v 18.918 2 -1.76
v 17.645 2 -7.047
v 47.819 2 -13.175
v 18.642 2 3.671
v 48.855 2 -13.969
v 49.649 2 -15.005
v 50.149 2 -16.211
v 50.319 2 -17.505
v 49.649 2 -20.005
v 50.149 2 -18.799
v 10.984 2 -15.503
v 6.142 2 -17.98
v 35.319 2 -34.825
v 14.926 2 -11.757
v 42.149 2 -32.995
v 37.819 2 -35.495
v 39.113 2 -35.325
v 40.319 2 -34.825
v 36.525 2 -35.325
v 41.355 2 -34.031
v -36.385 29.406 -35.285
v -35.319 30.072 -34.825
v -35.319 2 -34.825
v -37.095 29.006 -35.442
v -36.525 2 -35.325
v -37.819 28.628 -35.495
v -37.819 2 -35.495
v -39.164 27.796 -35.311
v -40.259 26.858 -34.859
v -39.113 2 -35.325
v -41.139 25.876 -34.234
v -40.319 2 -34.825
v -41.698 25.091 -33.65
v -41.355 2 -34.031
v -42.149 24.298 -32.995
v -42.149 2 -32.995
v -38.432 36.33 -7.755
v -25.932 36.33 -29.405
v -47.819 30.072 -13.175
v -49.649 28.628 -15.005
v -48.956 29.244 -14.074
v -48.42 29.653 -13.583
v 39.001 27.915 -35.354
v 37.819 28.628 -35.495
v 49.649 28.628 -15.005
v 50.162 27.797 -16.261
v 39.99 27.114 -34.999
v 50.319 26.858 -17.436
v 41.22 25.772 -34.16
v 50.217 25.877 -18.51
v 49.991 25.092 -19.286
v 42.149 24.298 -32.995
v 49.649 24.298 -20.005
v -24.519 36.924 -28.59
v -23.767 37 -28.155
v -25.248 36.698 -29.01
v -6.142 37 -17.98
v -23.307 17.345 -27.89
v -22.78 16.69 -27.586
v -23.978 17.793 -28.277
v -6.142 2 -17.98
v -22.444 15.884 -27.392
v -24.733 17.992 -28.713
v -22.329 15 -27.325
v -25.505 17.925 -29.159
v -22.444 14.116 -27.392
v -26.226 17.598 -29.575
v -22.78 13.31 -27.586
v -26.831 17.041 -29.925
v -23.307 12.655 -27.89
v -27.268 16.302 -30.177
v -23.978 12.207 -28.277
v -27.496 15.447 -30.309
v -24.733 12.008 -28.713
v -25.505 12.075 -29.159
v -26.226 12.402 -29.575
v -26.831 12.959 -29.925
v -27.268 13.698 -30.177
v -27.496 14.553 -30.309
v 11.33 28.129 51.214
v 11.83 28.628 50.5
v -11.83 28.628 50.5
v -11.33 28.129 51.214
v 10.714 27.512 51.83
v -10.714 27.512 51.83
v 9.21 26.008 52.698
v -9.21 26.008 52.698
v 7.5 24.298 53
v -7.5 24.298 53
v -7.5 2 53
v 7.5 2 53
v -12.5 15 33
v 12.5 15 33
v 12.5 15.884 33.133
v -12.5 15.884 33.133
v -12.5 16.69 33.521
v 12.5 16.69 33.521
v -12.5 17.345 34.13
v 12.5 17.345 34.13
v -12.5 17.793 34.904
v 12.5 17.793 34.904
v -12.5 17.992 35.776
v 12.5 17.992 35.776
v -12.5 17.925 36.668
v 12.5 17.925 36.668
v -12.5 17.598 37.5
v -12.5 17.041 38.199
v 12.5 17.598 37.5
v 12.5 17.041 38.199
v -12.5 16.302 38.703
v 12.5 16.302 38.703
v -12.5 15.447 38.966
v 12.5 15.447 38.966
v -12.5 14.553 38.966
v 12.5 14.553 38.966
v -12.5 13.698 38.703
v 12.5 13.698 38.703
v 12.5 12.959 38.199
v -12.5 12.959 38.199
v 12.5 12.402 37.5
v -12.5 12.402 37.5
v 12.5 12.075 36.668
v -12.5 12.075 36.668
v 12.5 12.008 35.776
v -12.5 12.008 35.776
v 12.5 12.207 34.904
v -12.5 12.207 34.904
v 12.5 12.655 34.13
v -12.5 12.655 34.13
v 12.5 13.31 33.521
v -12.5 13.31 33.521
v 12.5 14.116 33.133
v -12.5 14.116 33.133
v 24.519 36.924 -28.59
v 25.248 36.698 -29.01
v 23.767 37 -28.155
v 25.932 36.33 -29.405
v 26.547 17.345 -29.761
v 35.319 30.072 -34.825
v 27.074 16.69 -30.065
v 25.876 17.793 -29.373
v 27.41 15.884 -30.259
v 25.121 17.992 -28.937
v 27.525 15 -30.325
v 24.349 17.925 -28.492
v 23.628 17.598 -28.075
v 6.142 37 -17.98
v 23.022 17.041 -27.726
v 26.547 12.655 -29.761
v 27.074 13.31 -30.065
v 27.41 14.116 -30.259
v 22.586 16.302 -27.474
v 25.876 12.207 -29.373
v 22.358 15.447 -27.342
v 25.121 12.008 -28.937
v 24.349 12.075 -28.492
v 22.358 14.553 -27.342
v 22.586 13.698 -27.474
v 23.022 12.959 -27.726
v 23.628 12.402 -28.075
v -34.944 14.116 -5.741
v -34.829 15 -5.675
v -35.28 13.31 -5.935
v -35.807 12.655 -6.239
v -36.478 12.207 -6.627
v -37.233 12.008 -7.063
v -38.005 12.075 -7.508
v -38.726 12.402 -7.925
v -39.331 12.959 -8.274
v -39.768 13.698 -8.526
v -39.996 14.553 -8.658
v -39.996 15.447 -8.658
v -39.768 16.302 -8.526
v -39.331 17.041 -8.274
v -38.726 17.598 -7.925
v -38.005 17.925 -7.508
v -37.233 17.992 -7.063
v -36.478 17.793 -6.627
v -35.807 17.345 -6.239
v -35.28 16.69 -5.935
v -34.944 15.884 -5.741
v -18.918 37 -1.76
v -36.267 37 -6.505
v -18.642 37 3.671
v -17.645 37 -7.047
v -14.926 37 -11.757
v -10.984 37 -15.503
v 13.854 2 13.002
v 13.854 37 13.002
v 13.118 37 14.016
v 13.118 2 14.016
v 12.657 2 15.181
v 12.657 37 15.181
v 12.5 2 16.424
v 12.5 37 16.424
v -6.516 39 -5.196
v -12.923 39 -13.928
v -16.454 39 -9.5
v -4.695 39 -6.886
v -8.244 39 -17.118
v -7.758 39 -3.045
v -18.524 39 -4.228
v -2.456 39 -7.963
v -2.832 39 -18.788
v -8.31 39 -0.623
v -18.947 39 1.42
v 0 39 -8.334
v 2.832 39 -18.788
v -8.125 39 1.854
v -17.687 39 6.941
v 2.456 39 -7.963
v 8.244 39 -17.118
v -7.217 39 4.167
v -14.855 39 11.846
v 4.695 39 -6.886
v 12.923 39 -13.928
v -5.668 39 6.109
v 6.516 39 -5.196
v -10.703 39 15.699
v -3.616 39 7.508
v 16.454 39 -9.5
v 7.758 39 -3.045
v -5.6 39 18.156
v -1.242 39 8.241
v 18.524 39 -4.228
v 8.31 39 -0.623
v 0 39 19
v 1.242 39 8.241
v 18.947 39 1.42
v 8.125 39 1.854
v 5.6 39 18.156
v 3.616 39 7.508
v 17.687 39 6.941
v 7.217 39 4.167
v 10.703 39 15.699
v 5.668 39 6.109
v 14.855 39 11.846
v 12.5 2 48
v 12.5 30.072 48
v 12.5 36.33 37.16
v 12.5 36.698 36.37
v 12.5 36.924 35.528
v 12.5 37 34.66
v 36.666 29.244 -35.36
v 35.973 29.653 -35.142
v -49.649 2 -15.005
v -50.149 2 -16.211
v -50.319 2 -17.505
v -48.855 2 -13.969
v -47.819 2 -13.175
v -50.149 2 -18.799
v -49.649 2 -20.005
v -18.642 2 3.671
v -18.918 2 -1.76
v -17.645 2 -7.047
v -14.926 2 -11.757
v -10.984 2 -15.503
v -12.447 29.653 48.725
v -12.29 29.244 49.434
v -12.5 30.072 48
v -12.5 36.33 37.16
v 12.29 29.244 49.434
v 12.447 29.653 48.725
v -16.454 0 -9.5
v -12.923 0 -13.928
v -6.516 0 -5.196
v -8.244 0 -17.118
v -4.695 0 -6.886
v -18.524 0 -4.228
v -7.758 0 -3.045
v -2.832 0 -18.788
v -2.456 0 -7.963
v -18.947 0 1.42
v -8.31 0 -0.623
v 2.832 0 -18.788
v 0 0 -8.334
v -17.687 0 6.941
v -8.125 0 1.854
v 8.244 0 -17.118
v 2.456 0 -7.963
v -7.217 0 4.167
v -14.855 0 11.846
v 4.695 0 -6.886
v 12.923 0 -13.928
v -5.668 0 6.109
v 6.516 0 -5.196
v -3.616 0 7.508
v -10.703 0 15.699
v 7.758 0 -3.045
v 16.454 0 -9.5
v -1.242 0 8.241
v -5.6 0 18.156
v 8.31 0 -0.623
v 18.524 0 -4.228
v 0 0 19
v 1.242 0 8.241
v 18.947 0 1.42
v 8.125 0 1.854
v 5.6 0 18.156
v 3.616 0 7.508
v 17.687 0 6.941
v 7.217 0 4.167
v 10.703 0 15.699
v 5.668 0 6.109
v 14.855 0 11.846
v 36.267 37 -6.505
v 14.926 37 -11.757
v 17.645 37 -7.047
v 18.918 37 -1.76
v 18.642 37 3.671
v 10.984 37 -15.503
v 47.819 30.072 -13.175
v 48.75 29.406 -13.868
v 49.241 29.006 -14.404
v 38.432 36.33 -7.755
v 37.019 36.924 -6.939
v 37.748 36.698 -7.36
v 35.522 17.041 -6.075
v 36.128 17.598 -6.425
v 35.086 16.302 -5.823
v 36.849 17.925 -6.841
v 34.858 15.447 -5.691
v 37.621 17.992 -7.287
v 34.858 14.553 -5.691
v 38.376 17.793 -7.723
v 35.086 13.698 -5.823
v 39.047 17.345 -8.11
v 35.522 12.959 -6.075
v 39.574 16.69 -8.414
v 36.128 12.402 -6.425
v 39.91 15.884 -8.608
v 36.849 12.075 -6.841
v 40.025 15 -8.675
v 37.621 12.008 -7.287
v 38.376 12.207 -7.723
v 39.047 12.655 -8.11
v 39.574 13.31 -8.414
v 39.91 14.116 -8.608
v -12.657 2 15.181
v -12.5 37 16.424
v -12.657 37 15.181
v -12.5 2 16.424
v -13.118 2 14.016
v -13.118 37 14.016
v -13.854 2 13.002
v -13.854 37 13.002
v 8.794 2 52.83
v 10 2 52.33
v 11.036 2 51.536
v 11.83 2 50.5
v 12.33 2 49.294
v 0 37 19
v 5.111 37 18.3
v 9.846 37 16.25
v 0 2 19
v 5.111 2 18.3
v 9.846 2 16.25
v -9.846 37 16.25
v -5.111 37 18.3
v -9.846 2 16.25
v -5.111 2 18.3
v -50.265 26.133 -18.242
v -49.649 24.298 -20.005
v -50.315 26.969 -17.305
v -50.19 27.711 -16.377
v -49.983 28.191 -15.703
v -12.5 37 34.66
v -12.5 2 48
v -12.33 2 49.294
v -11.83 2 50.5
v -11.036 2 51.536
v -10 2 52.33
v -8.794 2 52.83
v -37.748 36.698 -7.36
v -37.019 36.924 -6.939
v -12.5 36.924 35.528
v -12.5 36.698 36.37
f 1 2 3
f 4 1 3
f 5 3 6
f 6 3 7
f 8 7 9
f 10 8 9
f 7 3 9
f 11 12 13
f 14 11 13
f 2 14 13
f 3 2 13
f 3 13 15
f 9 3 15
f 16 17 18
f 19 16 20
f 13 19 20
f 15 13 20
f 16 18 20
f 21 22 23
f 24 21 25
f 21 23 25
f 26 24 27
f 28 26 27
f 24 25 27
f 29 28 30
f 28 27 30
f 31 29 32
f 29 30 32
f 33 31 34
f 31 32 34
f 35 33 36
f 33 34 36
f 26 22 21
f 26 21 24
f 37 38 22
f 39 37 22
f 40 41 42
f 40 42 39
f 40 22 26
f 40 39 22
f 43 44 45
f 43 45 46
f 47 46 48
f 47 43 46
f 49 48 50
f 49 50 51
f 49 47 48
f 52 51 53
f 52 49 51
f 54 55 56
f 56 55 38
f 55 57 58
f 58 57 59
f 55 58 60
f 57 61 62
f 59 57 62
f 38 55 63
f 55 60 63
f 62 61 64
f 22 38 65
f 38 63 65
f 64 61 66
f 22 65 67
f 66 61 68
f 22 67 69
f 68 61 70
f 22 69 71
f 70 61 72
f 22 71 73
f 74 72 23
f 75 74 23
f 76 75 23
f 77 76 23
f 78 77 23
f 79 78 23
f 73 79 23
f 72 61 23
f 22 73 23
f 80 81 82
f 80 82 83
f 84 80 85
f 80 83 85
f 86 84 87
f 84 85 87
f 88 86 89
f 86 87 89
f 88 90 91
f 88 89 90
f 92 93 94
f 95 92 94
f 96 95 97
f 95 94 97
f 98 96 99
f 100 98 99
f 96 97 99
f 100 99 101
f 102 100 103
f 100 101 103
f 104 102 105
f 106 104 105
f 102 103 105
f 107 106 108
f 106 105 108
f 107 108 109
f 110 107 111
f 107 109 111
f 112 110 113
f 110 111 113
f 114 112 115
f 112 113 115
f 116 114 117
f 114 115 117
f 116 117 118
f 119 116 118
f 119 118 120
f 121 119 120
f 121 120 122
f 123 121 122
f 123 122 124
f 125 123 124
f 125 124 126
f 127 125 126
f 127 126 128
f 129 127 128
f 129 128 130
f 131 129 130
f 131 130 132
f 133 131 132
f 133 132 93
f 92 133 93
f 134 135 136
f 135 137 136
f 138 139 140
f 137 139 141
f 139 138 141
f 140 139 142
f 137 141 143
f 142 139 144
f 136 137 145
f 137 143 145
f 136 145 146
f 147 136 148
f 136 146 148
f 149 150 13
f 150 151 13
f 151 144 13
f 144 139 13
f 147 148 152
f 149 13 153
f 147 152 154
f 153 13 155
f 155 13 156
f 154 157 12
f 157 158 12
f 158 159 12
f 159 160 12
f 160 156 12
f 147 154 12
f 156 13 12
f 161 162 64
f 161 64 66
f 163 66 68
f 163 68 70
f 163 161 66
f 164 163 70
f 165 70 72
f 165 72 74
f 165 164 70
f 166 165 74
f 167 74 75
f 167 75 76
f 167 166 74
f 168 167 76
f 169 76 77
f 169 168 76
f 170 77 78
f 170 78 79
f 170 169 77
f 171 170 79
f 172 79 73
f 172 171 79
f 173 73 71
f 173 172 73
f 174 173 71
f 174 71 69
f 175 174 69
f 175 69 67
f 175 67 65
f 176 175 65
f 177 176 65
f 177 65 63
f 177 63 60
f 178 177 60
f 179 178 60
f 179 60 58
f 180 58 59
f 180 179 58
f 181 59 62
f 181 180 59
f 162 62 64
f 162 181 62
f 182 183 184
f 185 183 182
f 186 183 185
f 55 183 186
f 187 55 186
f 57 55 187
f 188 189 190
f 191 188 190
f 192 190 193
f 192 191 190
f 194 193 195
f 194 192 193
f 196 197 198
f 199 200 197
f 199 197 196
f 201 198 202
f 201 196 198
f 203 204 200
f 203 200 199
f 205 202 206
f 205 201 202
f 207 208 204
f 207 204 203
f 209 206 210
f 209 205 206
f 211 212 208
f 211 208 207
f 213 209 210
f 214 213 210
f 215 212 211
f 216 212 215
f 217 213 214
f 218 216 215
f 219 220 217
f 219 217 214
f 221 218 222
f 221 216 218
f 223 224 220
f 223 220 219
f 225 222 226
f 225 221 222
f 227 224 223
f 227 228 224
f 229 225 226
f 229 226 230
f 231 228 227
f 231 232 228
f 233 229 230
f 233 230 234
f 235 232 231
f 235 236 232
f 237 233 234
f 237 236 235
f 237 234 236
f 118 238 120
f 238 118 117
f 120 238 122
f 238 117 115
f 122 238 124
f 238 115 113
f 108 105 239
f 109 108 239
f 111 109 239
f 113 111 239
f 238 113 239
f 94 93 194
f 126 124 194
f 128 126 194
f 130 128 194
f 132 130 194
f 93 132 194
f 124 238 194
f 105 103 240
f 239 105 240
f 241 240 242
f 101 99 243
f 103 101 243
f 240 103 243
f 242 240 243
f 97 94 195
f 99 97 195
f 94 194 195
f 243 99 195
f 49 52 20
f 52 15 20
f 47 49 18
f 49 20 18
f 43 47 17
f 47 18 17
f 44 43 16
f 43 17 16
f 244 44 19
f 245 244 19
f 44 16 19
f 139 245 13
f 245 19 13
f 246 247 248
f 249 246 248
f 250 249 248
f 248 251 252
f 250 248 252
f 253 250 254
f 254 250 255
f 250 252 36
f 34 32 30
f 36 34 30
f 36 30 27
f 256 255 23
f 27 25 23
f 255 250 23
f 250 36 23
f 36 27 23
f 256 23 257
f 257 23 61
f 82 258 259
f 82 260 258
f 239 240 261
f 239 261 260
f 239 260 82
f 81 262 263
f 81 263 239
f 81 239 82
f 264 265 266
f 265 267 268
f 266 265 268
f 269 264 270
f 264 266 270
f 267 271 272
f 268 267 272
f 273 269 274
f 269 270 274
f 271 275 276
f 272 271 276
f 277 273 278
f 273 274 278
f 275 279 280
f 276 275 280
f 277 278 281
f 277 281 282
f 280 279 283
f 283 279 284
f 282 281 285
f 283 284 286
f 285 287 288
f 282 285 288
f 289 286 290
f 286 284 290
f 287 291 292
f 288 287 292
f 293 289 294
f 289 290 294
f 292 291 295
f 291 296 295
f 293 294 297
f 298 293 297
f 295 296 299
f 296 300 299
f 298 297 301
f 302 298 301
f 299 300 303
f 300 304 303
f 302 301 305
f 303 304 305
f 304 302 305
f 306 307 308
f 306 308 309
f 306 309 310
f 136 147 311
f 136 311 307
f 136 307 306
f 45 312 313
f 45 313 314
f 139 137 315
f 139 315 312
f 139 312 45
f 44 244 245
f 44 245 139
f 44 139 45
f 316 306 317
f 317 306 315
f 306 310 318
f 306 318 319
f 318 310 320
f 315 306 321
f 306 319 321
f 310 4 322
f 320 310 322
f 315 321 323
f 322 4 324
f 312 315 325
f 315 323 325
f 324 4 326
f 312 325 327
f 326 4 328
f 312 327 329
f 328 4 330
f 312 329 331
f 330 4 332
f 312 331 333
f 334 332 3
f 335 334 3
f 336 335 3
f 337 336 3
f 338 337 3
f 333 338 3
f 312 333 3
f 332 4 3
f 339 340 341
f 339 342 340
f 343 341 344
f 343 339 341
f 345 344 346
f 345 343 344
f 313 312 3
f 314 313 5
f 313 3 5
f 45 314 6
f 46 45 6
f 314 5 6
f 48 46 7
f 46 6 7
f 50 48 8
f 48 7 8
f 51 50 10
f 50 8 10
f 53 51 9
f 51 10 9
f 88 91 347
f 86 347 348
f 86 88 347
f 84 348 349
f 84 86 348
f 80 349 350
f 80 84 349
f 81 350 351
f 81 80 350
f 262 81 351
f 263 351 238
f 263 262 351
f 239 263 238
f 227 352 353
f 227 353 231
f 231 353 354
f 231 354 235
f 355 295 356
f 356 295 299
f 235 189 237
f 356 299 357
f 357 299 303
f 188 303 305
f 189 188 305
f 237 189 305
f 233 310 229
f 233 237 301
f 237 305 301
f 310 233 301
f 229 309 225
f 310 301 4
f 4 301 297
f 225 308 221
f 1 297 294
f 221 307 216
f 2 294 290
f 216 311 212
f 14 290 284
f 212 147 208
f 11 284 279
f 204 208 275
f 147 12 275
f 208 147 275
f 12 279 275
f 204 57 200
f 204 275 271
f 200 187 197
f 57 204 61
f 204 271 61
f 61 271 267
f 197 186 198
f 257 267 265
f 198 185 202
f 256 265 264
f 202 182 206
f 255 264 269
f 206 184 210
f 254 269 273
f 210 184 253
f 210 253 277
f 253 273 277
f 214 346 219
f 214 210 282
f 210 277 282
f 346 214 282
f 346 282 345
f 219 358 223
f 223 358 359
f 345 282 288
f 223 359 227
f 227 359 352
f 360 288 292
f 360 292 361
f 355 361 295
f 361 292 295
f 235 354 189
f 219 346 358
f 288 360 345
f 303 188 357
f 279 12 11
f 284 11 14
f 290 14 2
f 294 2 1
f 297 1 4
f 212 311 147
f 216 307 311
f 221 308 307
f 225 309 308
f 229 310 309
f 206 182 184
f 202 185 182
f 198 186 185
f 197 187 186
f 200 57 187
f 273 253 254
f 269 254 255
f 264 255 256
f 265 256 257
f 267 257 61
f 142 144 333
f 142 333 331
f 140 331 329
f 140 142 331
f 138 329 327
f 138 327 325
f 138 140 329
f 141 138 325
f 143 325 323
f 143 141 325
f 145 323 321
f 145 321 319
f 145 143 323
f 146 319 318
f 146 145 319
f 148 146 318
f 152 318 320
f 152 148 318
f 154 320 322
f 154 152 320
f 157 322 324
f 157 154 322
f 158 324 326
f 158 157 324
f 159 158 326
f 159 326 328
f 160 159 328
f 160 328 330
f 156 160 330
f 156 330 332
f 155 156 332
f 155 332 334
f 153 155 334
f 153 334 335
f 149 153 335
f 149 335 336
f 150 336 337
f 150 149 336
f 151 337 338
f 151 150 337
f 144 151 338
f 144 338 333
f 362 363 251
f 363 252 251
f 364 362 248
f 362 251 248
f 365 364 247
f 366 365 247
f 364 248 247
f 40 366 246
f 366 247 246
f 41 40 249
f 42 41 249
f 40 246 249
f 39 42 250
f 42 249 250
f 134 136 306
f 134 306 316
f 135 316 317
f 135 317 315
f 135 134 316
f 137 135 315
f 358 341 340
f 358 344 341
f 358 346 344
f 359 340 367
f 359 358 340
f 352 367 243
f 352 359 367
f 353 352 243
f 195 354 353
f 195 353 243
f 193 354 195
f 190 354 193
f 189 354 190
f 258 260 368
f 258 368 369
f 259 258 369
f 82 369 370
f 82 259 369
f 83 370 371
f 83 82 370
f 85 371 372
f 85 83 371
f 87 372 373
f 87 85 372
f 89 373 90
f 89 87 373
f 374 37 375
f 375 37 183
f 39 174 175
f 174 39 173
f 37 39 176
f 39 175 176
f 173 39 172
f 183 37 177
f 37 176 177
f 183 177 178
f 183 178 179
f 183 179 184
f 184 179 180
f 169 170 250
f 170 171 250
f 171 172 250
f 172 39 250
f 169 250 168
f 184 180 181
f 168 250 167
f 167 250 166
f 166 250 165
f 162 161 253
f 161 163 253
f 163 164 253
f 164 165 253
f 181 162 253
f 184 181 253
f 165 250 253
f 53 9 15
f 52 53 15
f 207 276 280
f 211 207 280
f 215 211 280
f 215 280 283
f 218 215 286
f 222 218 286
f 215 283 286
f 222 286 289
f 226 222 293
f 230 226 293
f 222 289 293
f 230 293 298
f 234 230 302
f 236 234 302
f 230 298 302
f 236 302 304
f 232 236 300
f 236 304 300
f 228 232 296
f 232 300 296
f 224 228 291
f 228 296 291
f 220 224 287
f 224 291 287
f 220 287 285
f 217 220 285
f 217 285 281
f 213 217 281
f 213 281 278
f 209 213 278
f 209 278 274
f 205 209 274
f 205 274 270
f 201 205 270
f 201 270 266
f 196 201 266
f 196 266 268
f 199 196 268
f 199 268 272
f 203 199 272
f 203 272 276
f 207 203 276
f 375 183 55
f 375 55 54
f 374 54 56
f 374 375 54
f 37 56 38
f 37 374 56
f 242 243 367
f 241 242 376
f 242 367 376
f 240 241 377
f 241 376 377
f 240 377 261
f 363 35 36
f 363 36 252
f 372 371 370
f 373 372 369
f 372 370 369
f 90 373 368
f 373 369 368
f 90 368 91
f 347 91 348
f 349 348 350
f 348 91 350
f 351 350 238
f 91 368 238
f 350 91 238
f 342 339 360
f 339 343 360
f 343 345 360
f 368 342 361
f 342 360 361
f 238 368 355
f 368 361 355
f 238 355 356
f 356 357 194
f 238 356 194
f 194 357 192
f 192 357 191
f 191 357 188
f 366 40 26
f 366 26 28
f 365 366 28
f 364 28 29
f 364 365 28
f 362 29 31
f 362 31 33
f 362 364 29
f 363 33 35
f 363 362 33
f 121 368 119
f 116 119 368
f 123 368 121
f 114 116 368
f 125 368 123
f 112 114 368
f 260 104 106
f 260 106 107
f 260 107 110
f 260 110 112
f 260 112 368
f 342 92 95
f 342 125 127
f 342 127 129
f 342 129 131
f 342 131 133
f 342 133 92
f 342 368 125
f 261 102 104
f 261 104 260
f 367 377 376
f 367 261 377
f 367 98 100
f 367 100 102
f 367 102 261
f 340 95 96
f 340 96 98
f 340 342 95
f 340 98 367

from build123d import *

# Parameters (mm, degrees)
CROQUIS2_R                = 19
SALIENTE_EXTRUIR1_DEPTH   = 39
CROQUIS3_W                = 25
CROQUIS3_H                = 35
SALIENTE_EXTRUIR2_DEPTH   = 53
CROQUIS4_R                = 3
CORTAR_EXTRUIR1_DEPTH     = 73.953752474
REDONDEO1_R               = 5
MATRIZC2_START            = 2
MATRIZC2_DEPTH            = 9.9999999
MATRIZC2_START_2          = 18.0000001
MATRIZC2_2_DEPTH          = 6.298293978
MATRIZC2_START_3          = 11.9999999
MATRIZC2_3_DEPTH          = 25.0000001
MATRIZC2_START_4          = -12.5
MATRIZC2_4_OUTLINE_R      = 3
MATRIZC2_4_DEPTH          = 25
MATRIZC2_5_OUTLINE_R      = 3
MATRIZC2_5_DEPTH          = 25
TALADRO_ROSCADO_3_4_102_D = 16.66748


with BuildPart() as part:
    # Croquis2 → Saliente-Extruir1 (new body)
    with BuildSketch(Plane(origin=(0, 0, 0), x_dir=(1, 0, 0), z_dir=(0, 1, 0))):
        with Locations(Location((0, 0, 0), (0, 0, 270))):
            Circle(CROQUIS2_R)
    extrude(amount=SALIENTE_EXTRUIR1_DEPTH)

    # Croquis3 → Saliente-Extruir2 (add)
    with BuildSketch(Plane.XY):
        with Locations((0, 19.5)):
            Rectangle(CROQUIS3_W, CROQUIS3_H)
    extrude(amount=SALIENTE_EXTRUIR2_DEPTH)

    # Croquis4 → Cortar-Extruir1 (cut, through all)
    with BuildSketch(Plane(origin=(12.5, 0, 0), x_dir=(0, 0, -1), z_dir=(1, 0, 0))):
        with Locations((-36, 15)):
            Circle(CROQUIS4_R)
        Polygon((-53, 27.185045424), (-53, 37), (-36, 37), align=None)
    extrude(amount=-CORTAR_EXTRUIR1_DEPTH, mode=Mode.SUBTRACT)

    # Redondeo1
    redondeo1_edges = [part.edges().sort_by_distance(p)[0] for p in [
        (12.5, 14.592522712, 53),
        (-12.5, 14.592522712, 53),
        (0, 27.185045424, 53),
        (0, 37, 36),
        (12.5, 19.5, 14.309088021),
        (-12.5, 19.5, 14.309088021),
    ]]
    fillet(redondeo1_edges, radius=REDONDEO1_R)

    # MatrizC2: read off the stored shape, not the designer's step
    # MatrizC2 outline → MatrizC2 (add)
    with BuildSketch(Plane(origin=(0, 0, 0), x_dir=(1, 0, 0), z_dir=(0, 1, 0)).offset(MATRIZC2_START)):
        with BuildLine():
            Line((-42.149346401, 32.995190528), (-49.649346401, 20.004809472))
            ThreePointArc((-49.649346401, 20.004809472), (-50.148848513, 16.210714247), (-47.819219382, 13.174682453))
            Line((-47.819219382, 13.174682453), (-18.642033731, -3.670773537))
            ThreePointArc((-18.642033731, -3.670773537), (-16.454482672, 9.5), (-6.142033731, 17.979861558))
            Line((-6.142033731, 17.979861558), (-35.319219382, 34.825317547))
            ThreePointArc((-35.319219382, 34.825317547), (-39.113314608, 35.32481966), (-42.149346401, 32.995190528))
        make_face()
        with BuildLine():
            ThreePointArc((6.142033731, 17.979861558), (16.454482672, 9.5), (18.642033731, -3.670773537))
            Line((18.642033731, -3.670773537), (47.819219382, 13.174682453))
            ThreePointArc((47.819219382, 13.174682453), (50.148848513, 16.210714247), (49.649346401, 20.004809472))
            Line((49.649346401, 20.004809472), (42.149346401, 32.995190528))
            ThreePointArc((42.149346401, 32.995190528), (39.113314608, 35.32481966), (35.319219382, 34.825317547))
            Line((35.319219382, 34.825317547), (6.142033731, 17.979861558))
        make_face()
    extrude(amount=MATRIZC2_DEPTH)

    # MatrizC2 2 outline → MatrizC2 2 (add)
    with BuildSketch(Plane(origin=(0, 0, 0), x_dir=(1, 0, 0), z_dir=(0, 1, 0)).offset(MATRIZC2_START_2)):
        with BuildLine():
            Line((-42.149346401, 32.995190528), (-49.649346401, 20.004809472))
            ThreePointArc((-49.649346401, 20.004809472), (-50.148848513, 16.210714247), (-47.819219382, 13.174682453))
            Line((-47.819219382, 13.174682453), (-18.642033731, -3.670773537))
            ThreePointArc((-18.642033731, -3.670773537), (-16.454482672, 9.5), (-6.142033731, 17.979861558))
            Line((-6.142033731, 17.979861558), (-35.319219382, 34.825317547))
            ThreePointArc((-35.319219382, 34.825317547), (-39.113314608, 35.32481966), (-42.149346401, 32.995190528))
        make_face()
        with BuildLine():
            ThreePointArc((6.142033731, 17.979861558), (16.454482672, 9.5), (18.642033731, -3.670773537))
            Line((18.642033731, -3.670773537), (47.819219382, 13.174682453))
            ThreePointArc((47.819219382, 13.174682453), (50.148848513, 16.210714247), (49.649346401, 20.004809472))
            Line((49.649346401, 20.004809472), (42.149346401, 32.995190528))
            ThreePointArc((42.149346401, 32.995190528), (39.113314608, 35.32481966), (35.319219382, 34.825317547))
            Line((35.319219382, 34.825317547), (6.142033731, 17.979861558))
        make_face()
    extrude(amount=MATRIZC2_2_DEPTH)

    # MatrizC2 3 outline → MatrizC2 3 (add)
    with BuildSketch(Plane(origin=(0, 0, 0), x_dir=(1, 0, 0), z_dir=(0, 1, 0)).offset(MATRIZC2_START_3)):
        with BuildLine():
            Line((-42.149346401, 32.995190528), (-49.649346401, 20.004809472))
            ThreePointArc((-49.649346401, 20.004809472), (-50.148848513, 16.210714247), (-47.819219382, 13.174682453))
            Line((-47.819219382, 13.174682453), (-18.642033731, -3.670773537))
            ThreePointArc((-18.642033731, -3.670773537), (-16.454482672, 9.5), (-6.142033731, 17.979861558))
            Line((-6.142033731, 17.979861558), (-35.319219382, 34.825317547))
            ThreePointArc((-35.319219382, 34.825317547), (-39.113314608, 35.32481966), (-42.149346401, 32.995190528))
        make_face()
        with BuildLine():
            ThreePointArc((6.142033731, 17.979861558), (16.454482672, 9.5), (18.642033731, -3.670773537))
            Line((18.642033731, -3.670773537), (47.819219382, 13.174682453))
            ThreePointArc((47.819219382, 13.174682453), (50.148848513, 16.210714247), (49.649346401, 20.004809472))
            Line((49.649346401, 20.004809472), (42.149346401, 32.995190528))
            ThreePointArc((42.149346401, 32.995190528), (39.113314608, 35.32481966), (35.319219382, 34.825317547))
            Line((35.319219382, 34.825317547), (6.142033731, 17.979861558))
        make_face()
    extrude(amount=MATRIZC2_3_DEPTH)

    # MatrizC2 4 outline → MatrizC2 4 (cut)
    with BuildSketch(Plane(origin=(0, 0, 0), x_dir=(0.8660254037844362, 0, -0.5000000000000042), z_dir=(0.5000000000000042, 0, 0.8660254037844363)).offset(MATRIZC2_START_4)):
        with BuildLine():
            ThreePointArc((34.660254038, 37), (35.954349263, 36.829629131), (37.160254038, 36.330127019))
            Line((37.160254038, 36.330127019), (50.5, 28.628421097))
            ThreePointArc((50.5, 28.628421097), (52.330127019, 26.798294078), (53, 24.298294078))
            Line((53, 24.298294078), (53.000000001, 37))
            Line((53.000000001, 37), (34.660254038, 37))
        make_face()
        with Locations((36, 15)):
            Circle(MATRIZC2_4_OUTLINE_R)
    extrude(amount=MATRIZC2_4_DEPTH, mode=Mode.SUBTRACT)

    # MatrizC2 5 outline → MatrizC2 5 (cut)
    with BuildSketch(Plane(origin=(0, 0, 0), x_dir=(0.8660254037844431, 0, 0.4999999999999921), z_dir=(0.4999999999999921, 0, -0.8660254037844433)).offset(MATRIZC2_START_4)):
        with BuildLine():
            ThreePointArc((-34.660254038, -37), (-35.954349263, -36.829629131), (-37.160254038, -36.330127019))
            Line((-37.160254038, -36.330127019), (-50.5, -28.628421097))
            ThreePointArc((-50.5, -28.628421097), (-52.330127019, -26.798294078), (-53, -24.298294078))
            Line((-53, -24.298294078), (-53, -37))
            Line((-53, -37), (-34.660254038, -37))
        make_face()
        with Locations((-36, -15)):
            Circle(MATRIZC2_5_OUTLINE_R)
    extrude(amount=MATRIZC2_5_DEPTH, mode=Mode.SUBTRACT)

    # Taladro roscado 3/4-102 (through all)
    with Locations(Plane.ZX.offset(39)):
        with Locations((0, 0)):
            Hole(TALADRO_ROSCADO_3_4_102_D / 2)


solid = part.part
